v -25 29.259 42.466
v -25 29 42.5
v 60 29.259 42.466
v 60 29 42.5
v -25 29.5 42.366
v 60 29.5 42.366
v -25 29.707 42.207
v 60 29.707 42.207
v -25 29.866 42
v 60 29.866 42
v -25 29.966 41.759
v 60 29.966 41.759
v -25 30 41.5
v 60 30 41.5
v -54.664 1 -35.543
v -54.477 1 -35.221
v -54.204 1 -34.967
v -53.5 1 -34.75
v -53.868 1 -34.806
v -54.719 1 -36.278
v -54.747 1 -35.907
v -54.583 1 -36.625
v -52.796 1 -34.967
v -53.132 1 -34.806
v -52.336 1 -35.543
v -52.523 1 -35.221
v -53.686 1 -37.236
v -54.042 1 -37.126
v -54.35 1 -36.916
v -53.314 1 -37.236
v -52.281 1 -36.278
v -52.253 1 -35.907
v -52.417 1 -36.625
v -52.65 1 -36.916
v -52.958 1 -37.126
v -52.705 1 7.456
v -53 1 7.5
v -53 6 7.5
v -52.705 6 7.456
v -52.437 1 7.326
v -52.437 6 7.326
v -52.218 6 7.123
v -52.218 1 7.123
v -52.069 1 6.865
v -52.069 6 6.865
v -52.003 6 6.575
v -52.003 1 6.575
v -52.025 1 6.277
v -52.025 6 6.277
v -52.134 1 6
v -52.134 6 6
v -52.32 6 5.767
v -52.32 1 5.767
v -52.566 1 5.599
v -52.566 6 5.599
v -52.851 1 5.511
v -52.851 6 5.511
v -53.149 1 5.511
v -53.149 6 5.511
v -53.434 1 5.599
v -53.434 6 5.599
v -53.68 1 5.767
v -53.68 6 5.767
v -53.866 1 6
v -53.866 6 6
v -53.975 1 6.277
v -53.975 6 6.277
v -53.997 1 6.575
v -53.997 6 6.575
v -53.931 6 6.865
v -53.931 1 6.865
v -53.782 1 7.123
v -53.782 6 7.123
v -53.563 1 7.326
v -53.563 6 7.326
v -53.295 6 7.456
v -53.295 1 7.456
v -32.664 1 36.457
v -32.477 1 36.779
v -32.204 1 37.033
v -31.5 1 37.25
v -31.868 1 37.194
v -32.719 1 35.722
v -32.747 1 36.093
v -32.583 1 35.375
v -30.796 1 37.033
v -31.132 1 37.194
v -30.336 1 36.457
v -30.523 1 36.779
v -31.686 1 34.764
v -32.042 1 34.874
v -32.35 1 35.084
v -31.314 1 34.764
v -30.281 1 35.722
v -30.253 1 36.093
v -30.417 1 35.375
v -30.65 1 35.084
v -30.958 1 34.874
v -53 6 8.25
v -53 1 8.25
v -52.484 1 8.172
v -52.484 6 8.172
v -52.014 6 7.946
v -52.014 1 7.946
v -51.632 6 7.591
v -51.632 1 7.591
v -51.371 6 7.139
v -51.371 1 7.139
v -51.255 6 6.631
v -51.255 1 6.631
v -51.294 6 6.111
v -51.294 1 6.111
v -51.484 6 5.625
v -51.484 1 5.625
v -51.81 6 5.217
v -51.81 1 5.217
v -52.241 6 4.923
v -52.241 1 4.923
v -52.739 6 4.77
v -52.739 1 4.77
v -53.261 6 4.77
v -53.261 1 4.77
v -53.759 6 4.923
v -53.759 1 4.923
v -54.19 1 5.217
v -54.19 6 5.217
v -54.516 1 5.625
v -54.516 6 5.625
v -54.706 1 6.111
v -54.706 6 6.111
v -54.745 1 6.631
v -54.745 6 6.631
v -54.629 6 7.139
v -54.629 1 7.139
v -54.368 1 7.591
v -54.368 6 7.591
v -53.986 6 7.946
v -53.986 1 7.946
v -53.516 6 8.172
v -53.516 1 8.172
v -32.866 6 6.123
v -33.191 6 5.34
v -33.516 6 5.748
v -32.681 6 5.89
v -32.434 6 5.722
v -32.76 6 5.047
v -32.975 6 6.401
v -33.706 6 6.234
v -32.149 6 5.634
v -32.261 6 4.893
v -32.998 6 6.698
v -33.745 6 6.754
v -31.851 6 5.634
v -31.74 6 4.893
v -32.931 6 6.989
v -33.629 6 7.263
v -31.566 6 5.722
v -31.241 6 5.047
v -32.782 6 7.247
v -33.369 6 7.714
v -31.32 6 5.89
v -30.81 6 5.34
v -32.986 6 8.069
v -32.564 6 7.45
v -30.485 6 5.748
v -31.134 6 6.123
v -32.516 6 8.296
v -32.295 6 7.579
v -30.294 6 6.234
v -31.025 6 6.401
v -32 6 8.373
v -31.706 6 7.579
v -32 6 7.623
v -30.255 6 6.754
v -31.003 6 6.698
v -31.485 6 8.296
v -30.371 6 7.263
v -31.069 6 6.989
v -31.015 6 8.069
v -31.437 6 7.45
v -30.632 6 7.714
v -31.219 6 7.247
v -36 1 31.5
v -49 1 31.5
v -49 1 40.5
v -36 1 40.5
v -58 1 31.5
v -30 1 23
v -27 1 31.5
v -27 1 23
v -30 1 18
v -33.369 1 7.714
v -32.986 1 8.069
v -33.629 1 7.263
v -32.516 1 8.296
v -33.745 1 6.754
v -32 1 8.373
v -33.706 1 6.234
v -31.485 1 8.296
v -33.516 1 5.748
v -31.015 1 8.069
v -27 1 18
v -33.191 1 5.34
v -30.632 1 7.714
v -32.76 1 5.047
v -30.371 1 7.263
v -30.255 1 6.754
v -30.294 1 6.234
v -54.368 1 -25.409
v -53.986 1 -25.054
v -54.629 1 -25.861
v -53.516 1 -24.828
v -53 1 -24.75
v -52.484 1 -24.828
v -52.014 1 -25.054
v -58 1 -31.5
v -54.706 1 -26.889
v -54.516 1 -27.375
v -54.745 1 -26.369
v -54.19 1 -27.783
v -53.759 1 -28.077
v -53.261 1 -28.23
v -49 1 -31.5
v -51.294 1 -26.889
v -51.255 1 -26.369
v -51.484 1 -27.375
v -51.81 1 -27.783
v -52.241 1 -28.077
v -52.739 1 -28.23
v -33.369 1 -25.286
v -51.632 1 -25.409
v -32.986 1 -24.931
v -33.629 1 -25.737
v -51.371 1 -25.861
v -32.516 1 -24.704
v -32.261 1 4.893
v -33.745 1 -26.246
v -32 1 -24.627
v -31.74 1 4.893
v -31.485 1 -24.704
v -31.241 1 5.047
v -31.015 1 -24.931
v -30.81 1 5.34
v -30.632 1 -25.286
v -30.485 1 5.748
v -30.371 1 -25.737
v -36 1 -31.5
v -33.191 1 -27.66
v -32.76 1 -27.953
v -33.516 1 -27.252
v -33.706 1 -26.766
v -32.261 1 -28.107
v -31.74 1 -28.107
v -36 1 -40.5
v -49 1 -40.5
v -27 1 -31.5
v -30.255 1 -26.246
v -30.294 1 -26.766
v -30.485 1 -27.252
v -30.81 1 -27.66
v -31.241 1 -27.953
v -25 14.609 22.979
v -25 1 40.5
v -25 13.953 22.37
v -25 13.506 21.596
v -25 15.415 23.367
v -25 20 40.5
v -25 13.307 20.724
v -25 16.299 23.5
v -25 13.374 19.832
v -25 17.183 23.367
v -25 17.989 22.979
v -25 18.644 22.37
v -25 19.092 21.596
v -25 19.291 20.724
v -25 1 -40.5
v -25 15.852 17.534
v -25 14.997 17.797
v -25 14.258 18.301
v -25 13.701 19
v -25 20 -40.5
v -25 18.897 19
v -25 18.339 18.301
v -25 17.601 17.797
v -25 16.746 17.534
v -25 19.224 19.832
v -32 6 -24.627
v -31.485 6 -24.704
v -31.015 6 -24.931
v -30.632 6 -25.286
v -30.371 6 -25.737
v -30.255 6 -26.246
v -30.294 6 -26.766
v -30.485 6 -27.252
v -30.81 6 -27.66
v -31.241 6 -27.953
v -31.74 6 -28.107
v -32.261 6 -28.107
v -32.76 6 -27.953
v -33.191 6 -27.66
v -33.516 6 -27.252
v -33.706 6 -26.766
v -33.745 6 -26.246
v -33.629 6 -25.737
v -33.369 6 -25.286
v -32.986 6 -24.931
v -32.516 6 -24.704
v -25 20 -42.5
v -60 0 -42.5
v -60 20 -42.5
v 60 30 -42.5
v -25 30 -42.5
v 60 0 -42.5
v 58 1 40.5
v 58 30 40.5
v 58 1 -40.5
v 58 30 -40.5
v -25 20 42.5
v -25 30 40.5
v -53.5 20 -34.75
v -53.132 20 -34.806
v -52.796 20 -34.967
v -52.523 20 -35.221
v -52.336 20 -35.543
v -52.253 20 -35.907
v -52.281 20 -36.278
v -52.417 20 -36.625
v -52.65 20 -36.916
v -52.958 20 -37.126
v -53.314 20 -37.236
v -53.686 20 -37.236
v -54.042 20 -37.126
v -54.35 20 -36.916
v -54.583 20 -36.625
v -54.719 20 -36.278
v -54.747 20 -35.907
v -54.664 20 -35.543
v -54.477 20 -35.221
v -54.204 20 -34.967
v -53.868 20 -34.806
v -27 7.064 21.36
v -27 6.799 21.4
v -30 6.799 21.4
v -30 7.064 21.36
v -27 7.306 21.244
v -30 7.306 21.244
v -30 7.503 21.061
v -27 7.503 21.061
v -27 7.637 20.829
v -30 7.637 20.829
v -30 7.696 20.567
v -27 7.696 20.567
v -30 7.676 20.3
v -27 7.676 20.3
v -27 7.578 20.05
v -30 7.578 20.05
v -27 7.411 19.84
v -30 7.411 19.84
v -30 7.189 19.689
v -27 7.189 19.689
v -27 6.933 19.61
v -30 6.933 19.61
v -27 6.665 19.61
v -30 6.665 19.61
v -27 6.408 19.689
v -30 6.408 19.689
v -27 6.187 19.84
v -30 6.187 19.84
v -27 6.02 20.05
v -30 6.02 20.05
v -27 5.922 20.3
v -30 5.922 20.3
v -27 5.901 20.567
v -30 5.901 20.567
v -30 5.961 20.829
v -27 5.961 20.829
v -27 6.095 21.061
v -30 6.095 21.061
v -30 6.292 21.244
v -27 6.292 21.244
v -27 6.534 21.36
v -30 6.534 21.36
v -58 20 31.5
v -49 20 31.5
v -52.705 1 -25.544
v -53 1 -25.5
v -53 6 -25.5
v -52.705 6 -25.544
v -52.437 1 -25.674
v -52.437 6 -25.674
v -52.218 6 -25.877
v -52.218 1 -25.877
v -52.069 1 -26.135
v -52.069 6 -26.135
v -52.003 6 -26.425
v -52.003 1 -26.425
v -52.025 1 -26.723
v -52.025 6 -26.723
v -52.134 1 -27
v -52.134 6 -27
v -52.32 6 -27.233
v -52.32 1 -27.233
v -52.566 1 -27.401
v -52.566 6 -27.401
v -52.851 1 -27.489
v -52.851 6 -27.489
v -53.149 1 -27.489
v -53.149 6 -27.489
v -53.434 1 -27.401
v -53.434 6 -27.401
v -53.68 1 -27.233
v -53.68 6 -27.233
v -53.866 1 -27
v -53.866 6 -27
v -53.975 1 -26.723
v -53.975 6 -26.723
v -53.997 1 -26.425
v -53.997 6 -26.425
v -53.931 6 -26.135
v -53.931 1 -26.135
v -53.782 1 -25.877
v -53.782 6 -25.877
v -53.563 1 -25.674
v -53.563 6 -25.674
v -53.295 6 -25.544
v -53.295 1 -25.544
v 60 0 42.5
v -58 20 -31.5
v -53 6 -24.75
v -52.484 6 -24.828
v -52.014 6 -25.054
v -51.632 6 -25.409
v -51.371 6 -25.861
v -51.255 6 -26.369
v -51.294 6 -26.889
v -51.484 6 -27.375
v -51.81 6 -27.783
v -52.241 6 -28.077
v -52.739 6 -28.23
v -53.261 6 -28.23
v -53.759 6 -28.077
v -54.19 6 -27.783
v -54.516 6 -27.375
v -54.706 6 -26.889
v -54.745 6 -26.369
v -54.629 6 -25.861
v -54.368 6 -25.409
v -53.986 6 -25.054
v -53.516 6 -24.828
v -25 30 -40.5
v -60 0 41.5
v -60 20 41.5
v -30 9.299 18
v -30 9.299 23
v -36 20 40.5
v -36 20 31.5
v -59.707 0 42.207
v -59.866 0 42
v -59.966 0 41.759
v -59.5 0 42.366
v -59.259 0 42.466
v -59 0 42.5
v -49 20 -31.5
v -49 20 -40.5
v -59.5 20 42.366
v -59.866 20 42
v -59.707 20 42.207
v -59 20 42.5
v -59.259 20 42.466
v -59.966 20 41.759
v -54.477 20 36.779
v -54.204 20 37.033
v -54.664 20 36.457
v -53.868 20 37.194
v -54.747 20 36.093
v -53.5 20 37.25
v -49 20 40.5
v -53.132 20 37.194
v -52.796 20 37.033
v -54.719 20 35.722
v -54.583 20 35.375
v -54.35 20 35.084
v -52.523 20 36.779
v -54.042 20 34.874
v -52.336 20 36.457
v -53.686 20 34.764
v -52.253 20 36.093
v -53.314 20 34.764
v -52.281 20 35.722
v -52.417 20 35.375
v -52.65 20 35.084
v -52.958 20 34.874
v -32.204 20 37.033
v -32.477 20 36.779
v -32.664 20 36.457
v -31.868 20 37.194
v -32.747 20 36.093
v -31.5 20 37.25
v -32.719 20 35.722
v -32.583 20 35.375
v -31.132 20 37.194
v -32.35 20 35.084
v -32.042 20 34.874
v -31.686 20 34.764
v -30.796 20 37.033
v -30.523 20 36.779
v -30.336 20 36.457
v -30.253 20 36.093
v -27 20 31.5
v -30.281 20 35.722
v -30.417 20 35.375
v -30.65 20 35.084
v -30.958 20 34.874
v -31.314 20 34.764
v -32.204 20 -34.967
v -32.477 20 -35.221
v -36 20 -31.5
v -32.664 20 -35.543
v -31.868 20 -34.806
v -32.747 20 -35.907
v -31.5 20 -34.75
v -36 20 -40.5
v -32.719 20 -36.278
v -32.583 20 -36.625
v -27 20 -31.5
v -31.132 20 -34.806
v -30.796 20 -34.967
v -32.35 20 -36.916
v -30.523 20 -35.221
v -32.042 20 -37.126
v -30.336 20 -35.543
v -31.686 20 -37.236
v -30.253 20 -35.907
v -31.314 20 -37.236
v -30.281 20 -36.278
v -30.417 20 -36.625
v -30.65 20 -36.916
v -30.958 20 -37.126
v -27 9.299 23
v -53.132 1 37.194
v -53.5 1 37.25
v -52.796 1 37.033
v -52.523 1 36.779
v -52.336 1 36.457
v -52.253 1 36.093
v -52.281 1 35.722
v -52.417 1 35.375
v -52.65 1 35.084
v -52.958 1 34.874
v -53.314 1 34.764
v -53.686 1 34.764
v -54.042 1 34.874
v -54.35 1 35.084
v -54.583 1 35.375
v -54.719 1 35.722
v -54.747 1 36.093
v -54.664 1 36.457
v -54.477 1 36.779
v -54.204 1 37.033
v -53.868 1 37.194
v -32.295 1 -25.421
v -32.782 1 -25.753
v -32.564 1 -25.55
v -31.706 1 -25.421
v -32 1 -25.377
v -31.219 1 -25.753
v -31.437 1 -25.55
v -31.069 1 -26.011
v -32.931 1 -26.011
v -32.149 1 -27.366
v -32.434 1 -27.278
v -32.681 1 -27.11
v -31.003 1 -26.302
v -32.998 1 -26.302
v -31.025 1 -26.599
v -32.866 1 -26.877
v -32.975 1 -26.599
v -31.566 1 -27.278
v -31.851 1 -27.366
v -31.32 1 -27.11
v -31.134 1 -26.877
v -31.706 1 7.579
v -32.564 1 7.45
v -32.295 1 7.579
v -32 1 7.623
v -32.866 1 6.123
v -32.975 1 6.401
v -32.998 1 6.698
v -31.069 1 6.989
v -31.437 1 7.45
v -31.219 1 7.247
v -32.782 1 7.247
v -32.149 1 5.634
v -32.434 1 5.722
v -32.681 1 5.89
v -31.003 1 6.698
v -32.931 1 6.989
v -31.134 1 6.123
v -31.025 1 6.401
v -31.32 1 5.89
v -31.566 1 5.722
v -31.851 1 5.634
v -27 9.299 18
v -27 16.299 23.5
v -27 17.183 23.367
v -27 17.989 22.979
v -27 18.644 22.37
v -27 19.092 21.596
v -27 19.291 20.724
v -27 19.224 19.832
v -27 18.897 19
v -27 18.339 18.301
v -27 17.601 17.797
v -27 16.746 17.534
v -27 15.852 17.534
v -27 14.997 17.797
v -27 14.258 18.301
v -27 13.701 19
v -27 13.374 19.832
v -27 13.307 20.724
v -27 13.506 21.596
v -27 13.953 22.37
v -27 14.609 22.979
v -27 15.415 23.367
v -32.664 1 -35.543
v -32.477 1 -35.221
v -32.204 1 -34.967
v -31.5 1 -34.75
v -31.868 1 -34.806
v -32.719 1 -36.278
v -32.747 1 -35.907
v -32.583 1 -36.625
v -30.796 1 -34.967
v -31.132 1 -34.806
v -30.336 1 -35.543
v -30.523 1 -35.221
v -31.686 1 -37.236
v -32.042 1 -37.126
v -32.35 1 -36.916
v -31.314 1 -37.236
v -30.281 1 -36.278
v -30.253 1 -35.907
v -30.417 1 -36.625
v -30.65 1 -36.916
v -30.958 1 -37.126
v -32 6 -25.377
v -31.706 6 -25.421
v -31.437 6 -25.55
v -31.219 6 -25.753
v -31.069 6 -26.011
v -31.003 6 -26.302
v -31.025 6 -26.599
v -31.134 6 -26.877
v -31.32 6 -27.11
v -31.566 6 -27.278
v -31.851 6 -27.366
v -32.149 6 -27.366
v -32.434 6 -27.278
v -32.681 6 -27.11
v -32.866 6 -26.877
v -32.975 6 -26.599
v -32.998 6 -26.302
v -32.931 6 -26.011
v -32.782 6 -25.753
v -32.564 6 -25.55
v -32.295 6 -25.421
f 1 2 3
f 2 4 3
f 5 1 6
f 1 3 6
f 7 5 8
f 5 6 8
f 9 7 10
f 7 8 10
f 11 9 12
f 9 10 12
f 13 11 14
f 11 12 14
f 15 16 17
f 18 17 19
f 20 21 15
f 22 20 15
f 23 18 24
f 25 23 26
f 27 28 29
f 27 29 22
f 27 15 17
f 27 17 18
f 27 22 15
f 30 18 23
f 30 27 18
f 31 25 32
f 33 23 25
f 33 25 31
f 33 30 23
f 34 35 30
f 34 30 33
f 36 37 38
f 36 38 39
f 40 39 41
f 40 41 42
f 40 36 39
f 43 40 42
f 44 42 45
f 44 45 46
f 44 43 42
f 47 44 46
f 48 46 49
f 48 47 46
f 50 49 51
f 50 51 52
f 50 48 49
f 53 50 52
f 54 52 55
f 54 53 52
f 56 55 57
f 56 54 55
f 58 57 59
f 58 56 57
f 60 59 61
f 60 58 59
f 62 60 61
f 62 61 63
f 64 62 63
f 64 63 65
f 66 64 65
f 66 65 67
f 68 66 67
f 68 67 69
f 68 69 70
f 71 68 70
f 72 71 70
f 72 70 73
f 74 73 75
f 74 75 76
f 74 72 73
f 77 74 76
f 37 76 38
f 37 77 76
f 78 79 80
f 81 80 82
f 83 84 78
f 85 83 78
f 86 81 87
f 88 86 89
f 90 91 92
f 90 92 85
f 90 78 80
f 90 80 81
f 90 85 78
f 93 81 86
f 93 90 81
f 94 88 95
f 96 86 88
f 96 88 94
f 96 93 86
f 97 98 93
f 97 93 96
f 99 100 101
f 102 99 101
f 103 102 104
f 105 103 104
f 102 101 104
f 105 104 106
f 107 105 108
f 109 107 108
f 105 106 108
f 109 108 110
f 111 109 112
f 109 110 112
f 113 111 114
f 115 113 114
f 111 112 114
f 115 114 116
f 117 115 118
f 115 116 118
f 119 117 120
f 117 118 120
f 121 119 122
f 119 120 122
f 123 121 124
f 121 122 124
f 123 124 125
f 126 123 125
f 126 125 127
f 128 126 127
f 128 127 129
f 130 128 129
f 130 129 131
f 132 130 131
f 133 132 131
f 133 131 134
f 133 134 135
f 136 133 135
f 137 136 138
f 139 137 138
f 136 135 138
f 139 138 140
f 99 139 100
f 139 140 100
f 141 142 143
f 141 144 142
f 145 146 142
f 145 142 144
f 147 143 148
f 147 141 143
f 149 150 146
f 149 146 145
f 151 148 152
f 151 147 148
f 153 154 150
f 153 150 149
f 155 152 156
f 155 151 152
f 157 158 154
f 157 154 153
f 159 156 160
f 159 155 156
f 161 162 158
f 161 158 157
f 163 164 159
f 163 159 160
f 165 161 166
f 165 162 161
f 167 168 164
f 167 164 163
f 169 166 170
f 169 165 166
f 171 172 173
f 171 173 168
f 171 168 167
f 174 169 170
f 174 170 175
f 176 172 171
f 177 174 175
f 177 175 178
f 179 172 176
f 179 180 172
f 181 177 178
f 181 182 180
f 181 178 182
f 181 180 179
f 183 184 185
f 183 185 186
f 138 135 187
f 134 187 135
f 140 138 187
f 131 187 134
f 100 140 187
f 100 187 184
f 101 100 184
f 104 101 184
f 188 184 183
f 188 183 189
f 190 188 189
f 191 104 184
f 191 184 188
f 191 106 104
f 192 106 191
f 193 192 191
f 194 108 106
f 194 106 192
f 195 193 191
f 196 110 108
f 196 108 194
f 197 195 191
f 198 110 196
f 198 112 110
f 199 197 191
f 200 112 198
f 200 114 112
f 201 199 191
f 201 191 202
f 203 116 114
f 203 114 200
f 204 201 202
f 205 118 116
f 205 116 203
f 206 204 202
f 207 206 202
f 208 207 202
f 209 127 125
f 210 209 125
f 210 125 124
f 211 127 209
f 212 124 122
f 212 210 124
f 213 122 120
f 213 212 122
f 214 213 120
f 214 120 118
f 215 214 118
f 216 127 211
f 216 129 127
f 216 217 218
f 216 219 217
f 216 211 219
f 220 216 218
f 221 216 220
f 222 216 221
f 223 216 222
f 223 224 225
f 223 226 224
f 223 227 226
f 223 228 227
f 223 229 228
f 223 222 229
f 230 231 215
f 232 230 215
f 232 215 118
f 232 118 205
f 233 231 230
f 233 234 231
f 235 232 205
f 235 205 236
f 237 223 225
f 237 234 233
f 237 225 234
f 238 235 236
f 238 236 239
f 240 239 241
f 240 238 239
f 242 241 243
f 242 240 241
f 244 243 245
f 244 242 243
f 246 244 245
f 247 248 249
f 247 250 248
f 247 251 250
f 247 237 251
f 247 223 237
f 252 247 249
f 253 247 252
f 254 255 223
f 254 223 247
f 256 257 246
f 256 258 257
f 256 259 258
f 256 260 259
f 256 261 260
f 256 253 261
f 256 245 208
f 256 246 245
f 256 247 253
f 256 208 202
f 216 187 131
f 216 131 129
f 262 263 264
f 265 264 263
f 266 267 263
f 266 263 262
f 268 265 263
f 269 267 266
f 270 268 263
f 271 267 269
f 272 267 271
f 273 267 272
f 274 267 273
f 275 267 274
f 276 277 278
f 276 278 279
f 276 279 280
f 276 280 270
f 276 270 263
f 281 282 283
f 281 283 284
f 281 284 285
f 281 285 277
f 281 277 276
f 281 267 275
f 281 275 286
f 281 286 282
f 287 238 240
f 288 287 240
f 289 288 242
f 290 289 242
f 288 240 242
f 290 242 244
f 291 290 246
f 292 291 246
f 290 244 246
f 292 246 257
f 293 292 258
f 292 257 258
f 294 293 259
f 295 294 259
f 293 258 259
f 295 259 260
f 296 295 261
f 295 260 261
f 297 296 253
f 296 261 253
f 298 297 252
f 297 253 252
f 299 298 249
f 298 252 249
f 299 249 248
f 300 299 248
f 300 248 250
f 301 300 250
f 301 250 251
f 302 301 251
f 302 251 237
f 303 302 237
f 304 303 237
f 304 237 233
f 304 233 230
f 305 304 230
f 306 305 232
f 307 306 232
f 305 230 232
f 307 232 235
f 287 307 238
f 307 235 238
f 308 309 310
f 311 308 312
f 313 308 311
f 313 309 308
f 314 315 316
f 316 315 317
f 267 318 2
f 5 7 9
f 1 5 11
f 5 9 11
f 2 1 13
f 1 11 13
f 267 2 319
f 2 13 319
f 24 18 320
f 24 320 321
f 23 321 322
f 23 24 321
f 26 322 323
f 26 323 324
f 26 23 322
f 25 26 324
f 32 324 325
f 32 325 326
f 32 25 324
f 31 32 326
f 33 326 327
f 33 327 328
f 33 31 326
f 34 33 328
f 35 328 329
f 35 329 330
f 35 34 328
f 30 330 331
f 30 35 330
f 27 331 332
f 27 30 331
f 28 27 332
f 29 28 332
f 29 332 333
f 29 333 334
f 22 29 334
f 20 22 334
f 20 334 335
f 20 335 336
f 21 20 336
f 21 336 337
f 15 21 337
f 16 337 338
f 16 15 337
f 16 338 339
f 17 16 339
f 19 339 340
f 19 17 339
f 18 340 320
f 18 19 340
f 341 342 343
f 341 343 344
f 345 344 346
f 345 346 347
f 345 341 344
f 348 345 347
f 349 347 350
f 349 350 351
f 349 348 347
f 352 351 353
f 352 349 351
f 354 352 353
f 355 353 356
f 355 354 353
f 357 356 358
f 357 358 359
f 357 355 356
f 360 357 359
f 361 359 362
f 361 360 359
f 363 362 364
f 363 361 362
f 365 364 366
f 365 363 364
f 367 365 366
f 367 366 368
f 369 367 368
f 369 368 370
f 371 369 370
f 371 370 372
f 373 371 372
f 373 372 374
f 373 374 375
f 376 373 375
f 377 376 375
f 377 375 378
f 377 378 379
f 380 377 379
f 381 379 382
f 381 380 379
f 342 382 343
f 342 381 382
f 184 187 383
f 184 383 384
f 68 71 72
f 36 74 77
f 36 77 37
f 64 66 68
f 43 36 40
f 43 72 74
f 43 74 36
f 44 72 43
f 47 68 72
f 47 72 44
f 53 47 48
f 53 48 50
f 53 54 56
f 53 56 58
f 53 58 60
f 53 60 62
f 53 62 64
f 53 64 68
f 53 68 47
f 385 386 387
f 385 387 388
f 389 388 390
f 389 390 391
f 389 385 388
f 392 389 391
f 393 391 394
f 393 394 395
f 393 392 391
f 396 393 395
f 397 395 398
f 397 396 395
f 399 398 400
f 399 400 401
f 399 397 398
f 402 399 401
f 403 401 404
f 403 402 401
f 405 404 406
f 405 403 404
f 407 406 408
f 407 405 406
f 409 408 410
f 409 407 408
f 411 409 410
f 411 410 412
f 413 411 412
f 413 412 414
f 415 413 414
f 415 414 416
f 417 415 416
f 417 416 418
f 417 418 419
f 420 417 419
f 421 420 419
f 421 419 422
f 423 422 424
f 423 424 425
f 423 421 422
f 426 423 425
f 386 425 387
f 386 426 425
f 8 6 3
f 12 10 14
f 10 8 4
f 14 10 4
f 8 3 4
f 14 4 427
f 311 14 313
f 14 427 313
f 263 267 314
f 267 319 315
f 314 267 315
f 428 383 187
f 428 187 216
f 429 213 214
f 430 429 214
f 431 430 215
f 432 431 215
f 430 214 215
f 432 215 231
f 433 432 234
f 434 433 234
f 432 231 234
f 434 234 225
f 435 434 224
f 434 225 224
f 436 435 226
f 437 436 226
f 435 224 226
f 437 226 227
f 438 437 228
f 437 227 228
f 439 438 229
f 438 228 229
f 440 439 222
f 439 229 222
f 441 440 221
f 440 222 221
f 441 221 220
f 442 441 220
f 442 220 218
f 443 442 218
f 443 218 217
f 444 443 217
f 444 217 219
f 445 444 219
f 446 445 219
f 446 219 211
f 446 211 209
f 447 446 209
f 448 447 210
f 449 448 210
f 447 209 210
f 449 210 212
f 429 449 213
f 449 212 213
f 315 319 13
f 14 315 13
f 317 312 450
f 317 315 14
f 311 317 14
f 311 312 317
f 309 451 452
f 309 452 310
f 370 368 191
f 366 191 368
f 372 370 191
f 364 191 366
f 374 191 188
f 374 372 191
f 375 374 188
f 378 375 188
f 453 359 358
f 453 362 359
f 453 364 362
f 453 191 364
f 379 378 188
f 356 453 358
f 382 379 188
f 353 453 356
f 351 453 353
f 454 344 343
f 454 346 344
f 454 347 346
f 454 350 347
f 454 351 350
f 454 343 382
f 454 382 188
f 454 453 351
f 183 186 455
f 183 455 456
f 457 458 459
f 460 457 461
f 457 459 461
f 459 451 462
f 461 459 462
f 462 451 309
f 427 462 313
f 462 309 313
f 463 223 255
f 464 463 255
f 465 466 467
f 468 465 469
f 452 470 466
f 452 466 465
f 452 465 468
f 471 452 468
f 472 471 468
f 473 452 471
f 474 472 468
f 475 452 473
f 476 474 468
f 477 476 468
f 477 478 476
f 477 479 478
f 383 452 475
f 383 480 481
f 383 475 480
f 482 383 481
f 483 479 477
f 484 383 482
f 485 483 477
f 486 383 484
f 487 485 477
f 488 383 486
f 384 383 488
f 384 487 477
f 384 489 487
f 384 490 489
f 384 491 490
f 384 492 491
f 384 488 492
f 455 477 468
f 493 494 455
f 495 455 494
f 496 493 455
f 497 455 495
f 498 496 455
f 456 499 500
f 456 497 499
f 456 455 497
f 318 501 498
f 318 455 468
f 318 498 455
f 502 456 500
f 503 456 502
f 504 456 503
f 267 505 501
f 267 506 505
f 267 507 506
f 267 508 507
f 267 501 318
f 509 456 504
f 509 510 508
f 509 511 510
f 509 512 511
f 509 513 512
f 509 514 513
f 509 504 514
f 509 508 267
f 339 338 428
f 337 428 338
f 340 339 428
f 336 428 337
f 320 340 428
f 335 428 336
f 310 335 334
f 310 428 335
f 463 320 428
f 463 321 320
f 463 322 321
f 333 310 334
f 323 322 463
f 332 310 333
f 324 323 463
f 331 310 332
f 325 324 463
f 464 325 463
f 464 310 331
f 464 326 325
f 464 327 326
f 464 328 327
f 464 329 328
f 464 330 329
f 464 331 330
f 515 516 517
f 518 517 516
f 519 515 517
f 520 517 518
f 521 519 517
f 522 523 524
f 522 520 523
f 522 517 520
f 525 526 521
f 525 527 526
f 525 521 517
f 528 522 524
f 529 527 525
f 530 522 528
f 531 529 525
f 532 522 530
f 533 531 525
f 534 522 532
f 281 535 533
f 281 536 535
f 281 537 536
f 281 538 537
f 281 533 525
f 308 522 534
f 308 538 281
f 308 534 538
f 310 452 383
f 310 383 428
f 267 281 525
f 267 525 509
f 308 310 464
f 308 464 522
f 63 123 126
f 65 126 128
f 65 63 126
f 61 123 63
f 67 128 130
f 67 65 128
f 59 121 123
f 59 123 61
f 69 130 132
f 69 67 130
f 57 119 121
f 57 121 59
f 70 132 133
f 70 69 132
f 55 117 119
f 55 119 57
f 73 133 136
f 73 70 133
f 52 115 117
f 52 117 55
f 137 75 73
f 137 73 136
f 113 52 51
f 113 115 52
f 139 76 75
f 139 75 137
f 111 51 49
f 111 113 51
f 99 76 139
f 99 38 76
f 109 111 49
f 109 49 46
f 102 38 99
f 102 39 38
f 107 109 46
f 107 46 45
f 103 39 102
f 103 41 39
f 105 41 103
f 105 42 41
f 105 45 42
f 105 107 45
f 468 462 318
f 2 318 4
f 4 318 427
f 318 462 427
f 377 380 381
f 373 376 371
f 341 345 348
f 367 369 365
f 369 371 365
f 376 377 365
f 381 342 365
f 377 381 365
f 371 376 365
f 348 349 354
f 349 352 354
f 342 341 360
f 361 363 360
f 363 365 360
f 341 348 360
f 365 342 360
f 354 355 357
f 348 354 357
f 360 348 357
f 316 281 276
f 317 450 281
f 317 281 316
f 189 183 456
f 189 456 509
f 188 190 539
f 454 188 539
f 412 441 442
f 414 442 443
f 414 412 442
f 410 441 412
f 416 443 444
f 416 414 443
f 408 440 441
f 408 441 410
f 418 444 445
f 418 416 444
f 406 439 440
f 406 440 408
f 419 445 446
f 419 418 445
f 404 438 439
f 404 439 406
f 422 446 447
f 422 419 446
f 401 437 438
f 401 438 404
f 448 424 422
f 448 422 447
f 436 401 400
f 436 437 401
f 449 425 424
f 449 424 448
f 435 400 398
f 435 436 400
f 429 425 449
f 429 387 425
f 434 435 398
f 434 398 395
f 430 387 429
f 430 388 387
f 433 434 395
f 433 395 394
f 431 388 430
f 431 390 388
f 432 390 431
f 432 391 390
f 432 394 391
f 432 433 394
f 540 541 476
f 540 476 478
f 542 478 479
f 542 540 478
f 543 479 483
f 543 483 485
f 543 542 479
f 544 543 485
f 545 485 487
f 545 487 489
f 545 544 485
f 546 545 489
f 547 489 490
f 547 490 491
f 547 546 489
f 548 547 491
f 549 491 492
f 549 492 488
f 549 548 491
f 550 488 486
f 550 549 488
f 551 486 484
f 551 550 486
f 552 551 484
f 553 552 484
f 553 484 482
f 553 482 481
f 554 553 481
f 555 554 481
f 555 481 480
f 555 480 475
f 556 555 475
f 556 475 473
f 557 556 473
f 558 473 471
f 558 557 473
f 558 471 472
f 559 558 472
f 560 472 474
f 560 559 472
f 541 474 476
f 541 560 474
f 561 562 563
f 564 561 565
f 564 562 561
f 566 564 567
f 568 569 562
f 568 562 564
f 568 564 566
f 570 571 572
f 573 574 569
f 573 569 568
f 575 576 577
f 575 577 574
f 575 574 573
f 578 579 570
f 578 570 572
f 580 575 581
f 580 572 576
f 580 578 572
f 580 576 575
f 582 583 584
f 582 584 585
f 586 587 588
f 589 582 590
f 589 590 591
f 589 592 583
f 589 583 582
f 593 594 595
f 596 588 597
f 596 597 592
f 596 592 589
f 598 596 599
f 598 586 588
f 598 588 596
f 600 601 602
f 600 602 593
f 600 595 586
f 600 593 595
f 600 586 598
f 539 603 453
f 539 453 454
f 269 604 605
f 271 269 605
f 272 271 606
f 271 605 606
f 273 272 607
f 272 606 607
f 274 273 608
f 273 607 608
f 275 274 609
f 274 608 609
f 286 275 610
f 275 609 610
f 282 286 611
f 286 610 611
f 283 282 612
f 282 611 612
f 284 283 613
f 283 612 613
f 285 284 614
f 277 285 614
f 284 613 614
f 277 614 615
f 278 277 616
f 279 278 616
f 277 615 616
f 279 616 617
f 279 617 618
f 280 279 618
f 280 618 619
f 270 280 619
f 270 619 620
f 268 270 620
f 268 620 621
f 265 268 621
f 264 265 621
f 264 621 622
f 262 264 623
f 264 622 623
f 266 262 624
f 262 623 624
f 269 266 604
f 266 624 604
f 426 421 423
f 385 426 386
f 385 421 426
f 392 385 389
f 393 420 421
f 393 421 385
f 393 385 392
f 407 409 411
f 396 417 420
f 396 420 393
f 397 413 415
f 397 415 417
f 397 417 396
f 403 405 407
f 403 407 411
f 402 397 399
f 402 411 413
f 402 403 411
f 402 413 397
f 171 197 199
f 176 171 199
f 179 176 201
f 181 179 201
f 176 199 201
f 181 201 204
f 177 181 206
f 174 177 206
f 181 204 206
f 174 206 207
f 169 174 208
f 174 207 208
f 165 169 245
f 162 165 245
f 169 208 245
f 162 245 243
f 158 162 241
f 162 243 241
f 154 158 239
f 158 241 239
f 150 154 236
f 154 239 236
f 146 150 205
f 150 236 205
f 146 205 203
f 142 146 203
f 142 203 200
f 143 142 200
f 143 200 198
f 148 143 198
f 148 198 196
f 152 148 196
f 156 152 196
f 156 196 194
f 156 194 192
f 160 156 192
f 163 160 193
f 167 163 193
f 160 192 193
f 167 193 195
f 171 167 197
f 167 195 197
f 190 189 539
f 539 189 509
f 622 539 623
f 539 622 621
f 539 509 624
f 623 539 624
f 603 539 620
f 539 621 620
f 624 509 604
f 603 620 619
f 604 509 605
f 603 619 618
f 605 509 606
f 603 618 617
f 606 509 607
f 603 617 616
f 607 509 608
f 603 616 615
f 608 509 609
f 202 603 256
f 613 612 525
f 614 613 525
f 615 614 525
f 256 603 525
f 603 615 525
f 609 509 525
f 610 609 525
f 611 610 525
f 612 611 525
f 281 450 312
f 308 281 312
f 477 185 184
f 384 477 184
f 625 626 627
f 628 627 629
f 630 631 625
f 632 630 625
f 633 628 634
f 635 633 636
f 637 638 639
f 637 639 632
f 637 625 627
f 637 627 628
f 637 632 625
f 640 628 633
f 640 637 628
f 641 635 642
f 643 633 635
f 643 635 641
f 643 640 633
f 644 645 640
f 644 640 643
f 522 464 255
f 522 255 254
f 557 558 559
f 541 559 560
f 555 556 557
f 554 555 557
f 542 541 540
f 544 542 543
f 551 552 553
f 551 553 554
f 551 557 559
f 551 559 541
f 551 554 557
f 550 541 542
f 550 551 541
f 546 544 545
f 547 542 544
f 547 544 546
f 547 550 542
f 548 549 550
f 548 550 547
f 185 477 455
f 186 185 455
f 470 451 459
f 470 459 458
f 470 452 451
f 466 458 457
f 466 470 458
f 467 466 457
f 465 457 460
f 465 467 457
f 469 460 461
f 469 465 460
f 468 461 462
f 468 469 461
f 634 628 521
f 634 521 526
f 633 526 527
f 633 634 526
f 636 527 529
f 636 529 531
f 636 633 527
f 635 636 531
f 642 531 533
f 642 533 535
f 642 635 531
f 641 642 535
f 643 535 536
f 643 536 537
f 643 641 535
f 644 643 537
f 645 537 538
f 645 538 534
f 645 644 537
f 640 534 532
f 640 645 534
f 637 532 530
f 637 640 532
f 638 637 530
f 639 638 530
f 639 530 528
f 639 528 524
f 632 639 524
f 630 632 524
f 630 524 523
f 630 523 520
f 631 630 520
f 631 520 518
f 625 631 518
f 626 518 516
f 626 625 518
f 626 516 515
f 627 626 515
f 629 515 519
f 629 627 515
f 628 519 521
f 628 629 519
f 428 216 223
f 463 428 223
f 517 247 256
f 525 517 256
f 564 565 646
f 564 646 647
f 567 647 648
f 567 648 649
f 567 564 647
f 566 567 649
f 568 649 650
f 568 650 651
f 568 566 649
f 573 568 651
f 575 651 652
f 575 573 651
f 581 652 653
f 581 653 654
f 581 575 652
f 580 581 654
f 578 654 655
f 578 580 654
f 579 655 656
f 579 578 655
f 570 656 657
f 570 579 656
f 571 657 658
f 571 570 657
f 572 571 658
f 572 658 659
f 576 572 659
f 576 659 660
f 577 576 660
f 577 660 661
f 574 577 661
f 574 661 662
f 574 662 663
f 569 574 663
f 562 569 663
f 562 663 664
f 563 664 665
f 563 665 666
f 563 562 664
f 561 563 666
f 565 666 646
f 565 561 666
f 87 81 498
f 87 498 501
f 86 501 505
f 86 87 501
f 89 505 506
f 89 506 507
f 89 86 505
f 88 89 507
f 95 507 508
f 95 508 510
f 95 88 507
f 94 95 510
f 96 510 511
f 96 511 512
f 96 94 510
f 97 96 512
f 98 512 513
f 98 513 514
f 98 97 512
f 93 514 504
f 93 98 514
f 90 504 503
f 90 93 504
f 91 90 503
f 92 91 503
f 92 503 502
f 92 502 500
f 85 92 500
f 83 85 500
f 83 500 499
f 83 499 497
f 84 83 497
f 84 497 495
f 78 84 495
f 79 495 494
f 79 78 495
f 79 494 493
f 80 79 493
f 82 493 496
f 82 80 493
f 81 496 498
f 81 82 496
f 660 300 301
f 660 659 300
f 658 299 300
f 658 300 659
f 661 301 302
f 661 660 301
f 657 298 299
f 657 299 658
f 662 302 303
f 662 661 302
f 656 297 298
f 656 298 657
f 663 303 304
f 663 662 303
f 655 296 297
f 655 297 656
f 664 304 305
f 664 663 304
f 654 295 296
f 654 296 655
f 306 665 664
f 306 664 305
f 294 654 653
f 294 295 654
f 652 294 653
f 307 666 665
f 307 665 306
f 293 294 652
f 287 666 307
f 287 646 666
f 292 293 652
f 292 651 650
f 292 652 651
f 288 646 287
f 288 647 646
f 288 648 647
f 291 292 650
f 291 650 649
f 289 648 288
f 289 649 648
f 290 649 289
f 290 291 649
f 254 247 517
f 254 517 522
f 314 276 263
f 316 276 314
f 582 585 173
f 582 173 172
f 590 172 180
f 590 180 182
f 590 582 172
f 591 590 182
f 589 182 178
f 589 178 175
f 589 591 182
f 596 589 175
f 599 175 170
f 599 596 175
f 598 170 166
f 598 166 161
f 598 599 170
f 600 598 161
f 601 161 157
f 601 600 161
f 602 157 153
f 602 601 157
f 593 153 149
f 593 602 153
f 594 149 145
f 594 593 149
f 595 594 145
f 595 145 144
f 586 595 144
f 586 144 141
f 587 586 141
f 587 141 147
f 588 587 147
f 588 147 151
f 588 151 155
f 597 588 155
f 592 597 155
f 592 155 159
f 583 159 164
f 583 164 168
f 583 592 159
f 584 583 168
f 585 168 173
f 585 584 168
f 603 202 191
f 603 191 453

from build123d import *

# Parameters (mm, degrees)
SKETCH1_W           = 120
SKETCH1_H           = 85
BOSS_EXTRUDE1_DEPTH = 30
SKETCH2_W           = 83
SKETCH2_H           = 81
CUT_EXTRUDE1_DEPTH  = 29
SKETCH3_W           = 31
SKETCH3_H           = 81
CUT_EXTRUDE2_DEPTH  = 29
SKETCH4_W           = 35
SKETCH4_H           = 85
CUT_EXTRUDE3_DEPTH  = 10
SKETCH5_W           = 9
SKETCH5_H           = 9
SKETCH5_R           = 1.25
BOSS_EXTRUDE2_DEPTH = 19
SKETCH6_R           = 1.75
SKETCH6_R_2         = 1
BOSS_EXTRUDE3_DEPTH = 5
SKETCH7_W           = 5
SKETCH7_H           = 8.298973679
SKETCH7_R           = 0.9
BOSS_EXTRUDE4_DEPTH = 3
SKETCH8_R           = 3
CUT_EXTRUDE4_DEPTH  = 2
FILLET1_R           = 1


with BuildPart() as part:
    # Sketch1 → Boss-Extrude1 (new body)
    with BuildSketch(Plane(origin=(0, 0, 0), x_dir=(1, 0, 0), z_dir=(0, 1, 0))):
        Rectangle(SKETCH1_W, SKETCH1_H)
    extrude(amount=BOSS_EXTRUDE1_DEPTH)

    # Sketch2 → Cut-Extrude1 (cut)
    with BuildSketch(Plane(origin=(0, 30, 0), x_dir=(1, 0, 0), z_dir=(0, 1, 0))):
        with Locations((16.5, 0)):
            Rectangle(SKETCH2_W, SKETCH2_H)
    extrude(amount=-CUT_EXTRUDE1_DEPTH, mode=Mode.SUBTRACT)

    # Sketch3 → Cut-Extrude2 (cut)
    with BuildSketch(Plane(origin=(0, 30, 0), x_dir=(1, 0, 0), z_dir=(0, 1, 0))):
        with Locations((-42.5, 0)):
            Rectangle(SKETCH3_W, SKETCH3_H)
    extrude(amount=-CUT_EXTRUDE2_DEPTH, mode=Mode.SUBTRACT)

    # Sketch4 → Cut-Extrude3 (cut)
    with BuildSketch(Plane(origin=(0, 30, 0), x_dir=(1, 0, 0), z_dir=(0, 1, 0))):
        with Locations((-42.5, 0)):
            Rectangle(SKETCH4_W, SKETCH4_H)
    extrude(amount=-CUT_EXTRUDE3_DEPTH, mode=Mode.SUBTRACT)

    # Sketch5 → Boss-Extrude2 (add)
    # profile 1 of 4: a face of its own
    with BuildSketch(Plane(origin=(0, 1, 0), x_dir=(1, 0, 0), z_dir=(0, 1, 0))):
        with Locations((-31.5, 36)):
            Rectangle(SKETCH5_W, SKETCH5_H)
        with Locations(Location((-31.5, 36, 0), (0, 0, 270))):
            Circle(SKETCH5_R, mode=Mode.SUBTRACT)
    # profile 2 of 4: a face of its own
    with BuildSketch(Plane(origin=(0, 1, 0), x_dir=(1, 0, 0), z_dir=(0, 1, 0))):
        with Locations((-53.5, 36)):
            Rectangle(SKETCH5_W, SKETCH5_H)
        with Locations(Location((-53.5, 36, 0), (0, 0, 270))):
            Circle(SKETCH5_R, mode=Mode.SUBTRACT)
    # profile 3 of 4: a face of its own
    with BuildSketch(Plane(origin=(0, 1, 0), x_dir=(1, 0, 0), z_dir=(0, 1, 0))):
        with Locations((-31.5, -36)):
            Rectangle(SKETCH5_W, SKETCH5_H)
        with Locations(Location((-31.5, -36, 0), (0, 0, 270))):
            Circle(SKETCH5_R, mode=Mode.SUBTRACT)
    # profile 4 of 4: a face of its own
    with BuildSketch(Plane(origin=(0, 1, 0), x_dir=(1, 0, 0), z_dir=(0, 1, 0))):
        with Locations((-53.5, -36)):
            Rectangle(SKETCH5_W, SKETCH5_H)
        with Locations(Location((-53.5, -36, 0), (0, 0, 270))):
            Circle(SKETCH5_R, mode=Mode.SUBTRACT)
    extrude(amount=BOSS_EXTRUDE2_DEPTH)

    # Sketch6 → Boss-Extrude3 (add)
    # profile 1 of 4: a face of its own
    with BuildSketch(Plane(origin=(0, 1, 0), x_dir=(1, 0, 0), z_dir=(0, 1, 0))):
        with Locations(Location((-53, 26.5, 0), (0, 0, 270))):
            Circle(SKETCH6_R)
        with Locations(Location((-53, 26.5, 0), (0, 0, 270))):
            Circle(SKETCH6_R_2, mode=Mode.SUBTRACT)
    # profile 2 of 4: a face of its own
    with BuildSketch(Plane(origin=(0, 1, 0), x_dir=(1, 0, 0), z_dir=(0, 1, 0))):
        with Locations(Location((-32.000361852, 26.376721252, 0), (0, 0, 270))):
            Circle(SKETCH6_R)
        with Locations(Location((-32.000361852, 26.376721252, 0), (0, 0, 270))):
            Circle(SKETCH6_R_2, mode=Mode.SUBTRACT)
    # profile 3 of 4: a face of its own
    with BuildSketch(Plane(origin=(0, 1, 0), x_dir=(1, 0, 0), z_dir=(0, 1, 0))):
        with Locations(Location((-32.000361852, -6.623278748, 0), (0, 0, 270))):
            Circle(SKETCH6_R)
        with Locations(Location((-32.000361852, -6.623278748, 0), (0, 0, 270))):
            Circle(SKETCH6_R_2, mode=Mode.SUBTRACT)
    # profile 4 of 4: a face of its own
    with BuildSketch(Plane(origin=(0, 1, 0), x_dir=(1, 0, 0), z_dir=(0, 1, 0))):
        with Locations(Location((-53, -6.5, 0), (0, 0, 270))):
            Circle(SKETCH6_R)
        with Locations(Location((-53, -6.5, 0), (0, 0, 270))):
            Circle(SKETCH6_R_2, mode=Mode.SUBTRACT)
    extrude(amount=BOSS_EXTRUDE3_DEPTH)

    # Sketch7 → Boss-Extrude4 (add)
    with BuildSketch(Plane.ZY.offset(27)):
        with Locations((20.5, 5.14948684)):
            Rectangle(SKETCH7_W, SKETCH7_H)
        with Locations((20.5, 6.798973679)):
            Circle(SKETCH7_R, mode=Mode.SUBTRACT)
    extrude(amount=BOSS_EXTRUDE4_DEPTH)

    # Sketch8 → Cut-Extrude4 (cut)
    with BuildSketch(Plane.ZY.offset(27)):
        with Locations((20.5, 16.298973679)):
            Circle(SKETCH8_R)
    extrude(amount=-CUT_EXTRUDE4_DEPTH, mode=Mode.SUBTRACT)

    # Fillet1
    fillet1_edges = [part.edges().sort_by_distance(p)[0] for p in [
        (17.5, 30, 42.5),
        (-60, 10, 42.5),
    ]]
    fillet(fillet1_edges, radius=FILLET1_R)


solid = part.part
